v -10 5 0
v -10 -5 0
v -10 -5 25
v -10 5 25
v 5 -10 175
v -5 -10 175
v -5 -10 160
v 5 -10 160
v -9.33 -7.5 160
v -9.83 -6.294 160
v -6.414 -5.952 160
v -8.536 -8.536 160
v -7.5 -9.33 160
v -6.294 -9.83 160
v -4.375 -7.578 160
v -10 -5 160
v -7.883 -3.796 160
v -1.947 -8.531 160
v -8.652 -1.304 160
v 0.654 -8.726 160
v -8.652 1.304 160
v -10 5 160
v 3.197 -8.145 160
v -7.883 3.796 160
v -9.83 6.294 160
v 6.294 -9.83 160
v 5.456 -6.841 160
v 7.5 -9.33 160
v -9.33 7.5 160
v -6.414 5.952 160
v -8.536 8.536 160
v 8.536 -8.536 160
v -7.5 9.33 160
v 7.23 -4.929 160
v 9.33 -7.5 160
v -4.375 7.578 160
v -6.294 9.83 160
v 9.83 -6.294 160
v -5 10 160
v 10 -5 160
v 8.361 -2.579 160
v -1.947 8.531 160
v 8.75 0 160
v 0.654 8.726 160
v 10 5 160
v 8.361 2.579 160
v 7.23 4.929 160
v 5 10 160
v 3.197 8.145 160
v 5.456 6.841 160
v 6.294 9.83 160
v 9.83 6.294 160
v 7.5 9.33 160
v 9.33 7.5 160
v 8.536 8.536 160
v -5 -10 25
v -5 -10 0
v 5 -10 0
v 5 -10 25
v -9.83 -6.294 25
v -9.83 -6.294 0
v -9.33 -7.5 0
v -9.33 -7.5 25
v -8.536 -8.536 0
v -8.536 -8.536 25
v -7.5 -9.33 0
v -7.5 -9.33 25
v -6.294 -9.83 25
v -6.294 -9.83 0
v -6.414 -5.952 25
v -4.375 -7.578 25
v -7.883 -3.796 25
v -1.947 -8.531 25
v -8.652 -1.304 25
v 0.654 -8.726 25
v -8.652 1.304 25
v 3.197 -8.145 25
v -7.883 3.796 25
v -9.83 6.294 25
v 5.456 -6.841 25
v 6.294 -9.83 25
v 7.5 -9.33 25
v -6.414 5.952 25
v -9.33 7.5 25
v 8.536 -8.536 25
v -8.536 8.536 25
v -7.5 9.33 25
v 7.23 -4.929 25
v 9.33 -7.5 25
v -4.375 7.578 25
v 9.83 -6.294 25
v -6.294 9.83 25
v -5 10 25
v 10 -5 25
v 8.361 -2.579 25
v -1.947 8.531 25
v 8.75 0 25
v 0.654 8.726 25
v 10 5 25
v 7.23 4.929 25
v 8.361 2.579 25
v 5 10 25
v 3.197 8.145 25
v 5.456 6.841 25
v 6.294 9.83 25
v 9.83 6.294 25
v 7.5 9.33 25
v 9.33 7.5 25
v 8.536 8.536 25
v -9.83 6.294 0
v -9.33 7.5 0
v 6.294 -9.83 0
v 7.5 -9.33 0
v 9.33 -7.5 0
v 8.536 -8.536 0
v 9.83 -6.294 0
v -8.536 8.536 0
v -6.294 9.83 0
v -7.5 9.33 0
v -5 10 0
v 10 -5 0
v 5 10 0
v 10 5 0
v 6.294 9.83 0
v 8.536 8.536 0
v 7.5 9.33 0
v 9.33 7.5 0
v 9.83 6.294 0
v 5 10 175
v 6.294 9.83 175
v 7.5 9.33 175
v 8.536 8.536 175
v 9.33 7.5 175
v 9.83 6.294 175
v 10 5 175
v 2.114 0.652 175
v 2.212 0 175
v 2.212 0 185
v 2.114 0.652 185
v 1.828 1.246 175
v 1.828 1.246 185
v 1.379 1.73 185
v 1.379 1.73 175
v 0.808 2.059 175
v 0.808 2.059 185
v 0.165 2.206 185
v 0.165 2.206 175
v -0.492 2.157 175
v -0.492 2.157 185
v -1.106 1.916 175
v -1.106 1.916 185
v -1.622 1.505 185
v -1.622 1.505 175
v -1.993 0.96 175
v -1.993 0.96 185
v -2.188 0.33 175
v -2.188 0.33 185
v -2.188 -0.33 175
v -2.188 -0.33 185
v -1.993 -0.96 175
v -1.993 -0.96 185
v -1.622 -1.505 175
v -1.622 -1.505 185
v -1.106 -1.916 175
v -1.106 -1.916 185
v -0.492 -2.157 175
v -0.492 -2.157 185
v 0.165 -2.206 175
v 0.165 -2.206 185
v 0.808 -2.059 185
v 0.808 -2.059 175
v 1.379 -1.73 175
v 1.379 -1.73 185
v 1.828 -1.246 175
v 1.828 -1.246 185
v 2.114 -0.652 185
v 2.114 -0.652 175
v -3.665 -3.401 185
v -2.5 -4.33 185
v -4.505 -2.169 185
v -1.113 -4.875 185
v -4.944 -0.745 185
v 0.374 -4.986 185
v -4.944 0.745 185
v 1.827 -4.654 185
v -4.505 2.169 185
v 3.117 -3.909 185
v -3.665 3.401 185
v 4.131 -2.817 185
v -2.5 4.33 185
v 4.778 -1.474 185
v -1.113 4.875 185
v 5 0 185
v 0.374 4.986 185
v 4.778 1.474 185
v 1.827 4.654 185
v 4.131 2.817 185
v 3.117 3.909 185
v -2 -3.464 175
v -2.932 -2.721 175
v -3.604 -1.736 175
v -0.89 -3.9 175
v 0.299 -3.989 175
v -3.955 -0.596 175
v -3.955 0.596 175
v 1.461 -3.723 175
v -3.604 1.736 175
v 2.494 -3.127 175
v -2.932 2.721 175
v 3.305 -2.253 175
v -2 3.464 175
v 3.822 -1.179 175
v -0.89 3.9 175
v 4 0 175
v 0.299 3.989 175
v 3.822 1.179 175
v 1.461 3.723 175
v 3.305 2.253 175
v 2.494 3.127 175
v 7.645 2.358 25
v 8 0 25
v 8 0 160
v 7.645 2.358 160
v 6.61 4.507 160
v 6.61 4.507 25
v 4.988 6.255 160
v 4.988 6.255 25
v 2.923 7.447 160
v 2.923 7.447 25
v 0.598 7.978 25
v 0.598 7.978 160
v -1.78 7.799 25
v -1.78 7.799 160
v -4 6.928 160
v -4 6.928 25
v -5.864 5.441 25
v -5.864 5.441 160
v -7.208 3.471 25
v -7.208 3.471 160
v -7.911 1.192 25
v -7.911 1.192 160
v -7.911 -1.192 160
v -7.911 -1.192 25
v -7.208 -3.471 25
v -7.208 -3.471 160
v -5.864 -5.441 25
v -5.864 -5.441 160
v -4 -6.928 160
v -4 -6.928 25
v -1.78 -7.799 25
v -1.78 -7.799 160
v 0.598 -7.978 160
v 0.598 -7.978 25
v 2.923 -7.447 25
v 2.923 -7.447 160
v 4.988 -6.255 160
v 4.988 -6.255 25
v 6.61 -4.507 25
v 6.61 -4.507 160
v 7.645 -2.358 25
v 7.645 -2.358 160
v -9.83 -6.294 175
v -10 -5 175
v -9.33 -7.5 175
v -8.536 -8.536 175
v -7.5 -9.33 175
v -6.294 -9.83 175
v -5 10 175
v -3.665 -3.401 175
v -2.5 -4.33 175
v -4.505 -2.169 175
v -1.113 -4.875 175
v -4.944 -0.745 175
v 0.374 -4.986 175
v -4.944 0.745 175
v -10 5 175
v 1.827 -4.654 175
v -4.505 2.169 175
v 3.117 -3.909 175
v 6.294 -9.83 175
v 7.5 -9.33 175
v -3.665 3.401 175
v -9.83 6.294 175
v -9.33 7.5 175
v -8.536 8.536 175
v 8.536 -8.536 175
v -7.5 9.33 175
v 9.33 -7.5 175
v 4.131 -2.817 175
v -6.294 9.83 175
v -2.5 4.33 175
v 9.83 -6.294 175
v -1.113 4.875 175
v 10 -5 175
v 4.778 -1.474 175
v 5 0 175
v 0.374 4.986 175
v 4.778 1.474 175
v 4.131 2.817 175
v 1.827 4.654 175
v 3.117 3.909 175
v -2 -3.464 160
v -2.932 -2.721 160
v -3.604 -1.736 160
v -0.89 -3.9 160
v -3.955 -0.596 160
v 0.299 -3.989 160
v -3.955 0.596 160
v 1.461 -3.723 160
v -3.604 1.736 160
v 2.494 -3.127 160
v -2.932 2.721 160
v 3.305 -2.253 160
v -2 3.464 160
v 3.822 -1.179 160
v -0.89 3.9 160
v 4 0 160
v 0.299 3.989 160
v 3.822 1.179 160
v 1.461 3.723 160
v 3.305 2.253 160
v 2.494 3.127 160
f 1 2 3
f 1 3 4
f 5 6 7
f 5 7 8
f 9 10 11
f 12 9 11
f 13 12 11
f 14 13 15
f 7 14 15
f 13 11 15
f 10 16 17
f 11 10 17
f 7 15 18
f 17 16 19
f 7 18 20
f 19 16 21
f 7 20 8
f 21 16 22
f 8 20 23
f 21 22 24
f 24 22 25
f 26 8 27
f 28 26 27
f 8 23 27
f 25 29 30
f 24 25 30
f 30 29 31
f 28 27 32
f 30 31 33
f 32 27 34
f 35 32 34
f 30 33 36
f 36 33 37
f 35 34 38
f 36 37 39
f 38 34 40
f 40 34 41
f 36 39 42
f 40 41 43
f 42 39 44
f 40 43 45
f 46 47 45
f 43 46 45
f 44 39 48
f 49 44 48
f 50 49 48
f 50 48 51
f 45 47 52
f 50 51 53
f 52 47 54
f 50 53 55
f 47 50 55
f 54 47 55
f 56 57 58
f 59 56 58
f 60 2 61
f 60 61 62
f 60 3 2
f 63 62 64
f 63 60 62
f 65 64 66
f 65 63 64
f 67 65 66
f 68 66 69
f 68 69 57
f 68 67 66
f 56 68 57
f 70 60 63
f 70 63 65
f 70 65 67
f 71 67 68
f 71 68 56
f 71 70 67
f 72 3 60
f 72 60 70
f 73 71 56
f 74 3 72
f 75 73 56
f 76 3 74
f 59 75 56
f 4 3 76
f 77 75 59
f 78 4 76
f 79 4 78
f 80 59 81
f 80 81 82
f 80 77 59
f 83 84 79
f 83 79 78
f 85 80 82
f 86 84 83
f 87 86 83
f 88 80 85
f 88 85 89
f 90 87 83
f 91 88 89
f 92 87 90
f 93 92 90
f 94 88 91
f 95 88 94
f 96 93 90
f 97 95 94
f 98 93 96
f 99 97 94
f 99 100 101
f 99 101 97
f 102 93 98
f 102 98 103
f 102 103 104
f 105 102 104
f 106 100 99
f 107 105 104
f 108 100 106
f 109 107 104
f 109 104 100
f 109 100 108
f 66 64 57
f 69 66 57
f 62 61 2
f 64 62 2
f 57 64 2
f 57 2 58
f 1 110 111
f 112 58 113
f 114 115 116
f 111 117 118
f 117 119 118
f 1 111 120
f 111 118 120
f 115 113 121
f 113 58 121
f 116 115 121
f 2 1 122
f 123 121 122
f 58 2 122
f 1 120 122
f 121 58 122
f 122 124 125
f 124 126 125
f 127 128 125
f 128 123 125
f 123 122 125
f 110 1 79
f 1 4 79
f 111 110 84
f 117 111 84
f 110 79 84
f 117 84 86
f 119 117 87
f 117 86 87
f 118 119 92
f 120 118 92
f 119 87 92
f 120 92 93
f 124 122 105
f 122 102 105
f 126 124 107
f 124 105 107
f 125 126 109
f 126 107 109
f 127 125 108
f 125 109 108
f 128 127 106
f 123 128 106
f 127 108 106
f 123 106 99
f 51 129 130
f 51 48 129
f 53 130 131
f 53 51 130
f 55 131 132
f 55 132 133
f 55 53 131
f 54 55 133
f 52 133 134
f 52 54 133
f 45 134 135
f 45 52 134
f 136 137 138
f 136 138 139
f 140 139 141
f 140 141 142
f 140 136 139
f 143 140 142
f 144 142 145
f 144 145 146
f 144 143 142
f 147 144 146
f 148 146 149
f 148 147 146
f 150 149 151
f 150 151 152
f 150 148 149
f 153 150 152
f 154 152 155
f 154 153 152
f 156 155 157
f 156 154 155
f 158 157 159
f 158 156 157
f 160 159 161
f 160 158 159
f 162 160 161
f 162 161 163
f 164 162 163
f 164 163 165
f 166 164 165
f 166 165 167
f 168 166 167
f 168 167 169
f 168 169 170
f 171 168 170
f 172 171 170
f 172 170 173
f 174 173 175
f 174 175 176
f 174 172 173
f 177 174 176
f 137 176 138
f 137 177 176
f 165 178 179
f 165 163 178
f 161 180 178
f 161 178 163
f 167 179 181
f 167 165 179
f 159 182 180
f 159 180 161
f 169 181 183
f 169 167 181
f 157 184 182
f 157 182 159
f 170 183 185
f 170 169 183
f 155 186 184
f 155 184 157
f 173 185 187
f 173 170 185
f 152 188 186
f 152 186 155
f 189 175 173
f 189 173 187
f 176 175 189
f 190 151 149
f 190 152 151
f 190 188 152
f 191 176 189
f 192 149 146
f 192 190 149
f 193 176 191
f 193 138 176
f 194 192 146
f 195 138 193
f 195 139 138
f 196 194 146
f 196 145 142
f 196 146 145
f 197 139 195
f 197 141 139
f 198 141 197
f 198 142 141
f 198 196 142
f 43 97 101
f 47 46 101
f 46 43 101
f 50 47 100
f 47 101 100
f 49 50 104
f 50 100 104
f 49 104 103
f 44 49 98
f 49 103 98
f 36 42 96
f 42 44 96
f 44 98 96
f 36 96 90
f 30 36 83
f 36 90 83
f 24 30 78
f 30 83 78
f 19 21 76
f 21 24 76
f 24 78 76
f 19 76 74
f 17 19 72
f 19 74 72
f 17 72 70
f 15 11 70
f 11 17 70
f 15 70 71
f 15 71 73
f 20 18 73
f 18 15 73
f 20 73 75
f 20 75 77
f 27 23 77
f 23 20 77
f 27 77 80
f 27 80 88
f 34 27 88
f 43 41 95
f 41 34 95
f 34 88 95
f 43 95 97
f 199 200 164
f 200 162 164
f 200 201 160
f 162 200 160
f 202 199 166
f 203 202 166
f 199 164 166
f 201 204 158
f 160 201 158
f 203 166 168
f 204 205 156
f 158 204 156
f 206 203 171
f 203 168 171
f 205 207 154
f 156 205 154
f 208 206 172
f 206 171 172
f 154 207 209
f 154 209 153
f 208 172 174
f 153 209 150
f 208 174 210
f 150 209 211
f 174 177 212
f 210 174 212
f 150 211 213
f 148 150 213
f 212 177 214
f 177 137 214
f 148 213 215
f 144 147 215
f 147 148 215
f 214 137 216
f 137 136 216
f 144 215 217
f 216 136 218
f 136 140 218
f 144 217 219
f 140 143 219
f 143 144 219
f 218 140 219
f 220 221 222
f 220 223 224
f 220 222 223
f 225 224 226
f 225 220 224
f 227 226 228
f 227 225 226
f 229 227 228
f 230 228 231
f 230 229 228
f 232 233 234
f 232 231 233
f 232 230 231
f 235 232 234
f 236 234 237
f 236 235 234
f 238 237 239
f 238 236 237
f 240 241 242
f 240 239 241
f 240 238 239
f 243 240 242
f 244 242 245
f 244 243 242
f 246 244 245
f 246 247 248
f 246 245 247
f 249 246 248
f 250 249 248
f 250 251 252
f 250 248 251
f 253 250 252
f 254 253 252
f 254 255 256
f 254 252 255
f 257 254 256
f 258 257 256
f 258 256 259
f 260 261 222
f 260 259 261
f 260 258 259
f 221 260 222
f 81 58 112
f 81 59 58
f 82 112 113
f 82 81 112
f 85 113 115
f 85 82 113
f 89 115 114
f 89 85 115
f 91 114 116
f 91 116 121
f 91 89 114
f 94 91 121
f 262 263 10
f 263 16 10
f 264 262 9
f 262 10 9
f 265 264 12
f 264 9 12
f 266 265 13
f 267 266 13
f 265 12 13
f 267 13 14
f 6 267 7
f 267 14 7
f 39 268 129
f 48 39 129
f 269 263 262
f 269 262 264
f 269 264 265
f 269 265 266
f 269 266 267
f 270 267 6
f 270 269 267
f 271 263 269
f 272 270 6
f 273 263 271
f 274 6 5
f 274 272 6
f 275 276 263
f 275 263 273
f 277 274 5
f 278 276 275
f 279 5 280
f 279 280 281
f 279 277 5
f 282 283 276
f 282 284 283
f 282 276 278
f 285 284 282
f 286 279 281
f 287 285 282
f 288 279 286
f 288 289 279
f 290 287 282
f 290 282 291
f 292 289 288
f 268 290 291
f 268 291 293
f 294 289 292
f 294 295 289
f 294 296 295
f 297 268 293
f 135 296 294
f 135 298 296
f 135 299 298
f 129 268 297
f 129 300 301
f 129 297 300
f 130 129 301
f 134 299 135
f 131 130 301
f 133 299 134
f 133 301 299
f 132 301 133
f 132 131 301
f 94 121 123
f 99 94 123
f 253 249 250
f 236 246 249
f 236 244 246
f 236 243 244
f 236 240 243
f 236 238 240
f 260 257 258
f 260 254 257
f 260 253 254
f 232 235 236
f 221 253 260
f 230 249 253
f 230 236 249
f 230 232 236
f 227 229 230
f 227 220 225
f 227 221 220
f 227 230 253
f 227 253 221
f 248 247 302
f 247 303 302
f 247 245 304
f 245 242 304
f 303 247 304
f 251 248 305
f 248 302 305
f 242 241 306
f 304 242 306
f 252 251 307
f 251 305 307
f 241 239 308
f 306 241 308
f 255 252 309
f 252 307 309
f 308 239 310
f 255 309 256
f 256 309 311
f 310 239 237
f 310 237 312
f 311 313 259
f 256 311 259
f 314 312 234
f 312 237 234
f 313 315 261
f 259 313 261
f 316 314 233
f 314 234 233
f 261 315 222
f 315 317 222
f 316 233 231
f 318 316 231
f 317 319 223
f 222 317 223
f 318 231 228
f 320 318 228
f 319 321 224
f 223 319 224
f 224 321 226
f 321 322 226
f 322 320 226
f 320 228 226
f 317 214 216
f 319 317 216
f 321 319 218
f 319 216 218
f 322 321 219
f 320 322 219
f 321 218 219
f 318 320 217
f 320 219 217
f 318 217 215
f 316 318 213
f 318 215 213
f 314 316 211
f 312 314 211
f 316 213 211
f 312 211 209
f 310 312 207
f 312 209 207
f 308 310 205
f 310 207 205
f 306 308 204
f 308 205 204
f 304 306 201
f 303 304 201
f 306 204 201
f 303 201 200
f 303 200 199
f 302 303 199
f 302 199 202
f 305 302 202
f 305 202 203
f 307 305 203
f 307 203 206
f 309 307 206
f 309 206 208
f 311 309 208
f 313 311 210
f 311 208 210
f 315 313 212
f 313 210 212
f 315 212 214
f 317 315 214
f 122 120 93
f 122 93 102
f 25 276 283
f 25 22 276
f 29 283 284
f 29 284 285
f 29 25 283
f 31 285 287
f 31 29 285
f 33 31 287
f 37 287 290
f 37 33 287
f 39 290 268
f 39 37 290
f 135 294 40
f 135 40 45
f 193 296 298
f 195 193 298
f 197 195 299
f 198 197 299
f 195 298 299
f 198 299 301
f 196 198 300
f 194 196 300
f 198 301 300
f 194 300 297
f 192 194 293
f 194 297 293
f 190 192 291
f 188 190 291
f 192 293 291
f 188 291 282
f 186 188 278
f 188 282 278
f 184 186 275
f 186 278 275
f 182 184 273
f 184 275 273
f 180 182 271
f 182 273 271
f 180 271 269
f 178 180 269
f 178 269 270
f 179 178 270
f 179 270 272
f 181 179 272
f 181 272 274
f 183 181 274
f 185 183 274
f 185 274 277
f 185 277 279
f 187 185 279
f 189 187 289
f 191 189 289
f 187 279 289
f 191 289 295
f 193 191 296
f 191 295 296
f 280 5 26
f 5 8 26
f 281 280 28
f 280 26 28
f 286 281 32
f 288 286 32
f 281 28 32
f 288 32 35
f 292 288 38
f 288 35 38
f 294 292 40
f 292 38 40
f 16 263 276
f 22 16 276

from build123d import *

# Parameters (mm, degrees)
SKETCH_1_R      = 8.75
SKETCH_1_R_2    = 8
EXTRUDE_1_DEPTH = 175
SKETCH_2_W      = 20
SKETCH_2_H      = 20
EXTRUDE_2_DEPTH = 25
SKETCH_3_W      = 20
SKETCH_3_H      = 20
SKETCH_3_R      = 4
EXTRUDE_3_DEPTH = 15
FILLET_1_R      = 5
SKETCH_5_R      = 5
SKETCH_5_R_2    = 2.212387265
EXTRUDE_4_DEPTH = 10


with BuildPart() as part:
    # 草图1 → 凸台-拉伸1 (new body)
    with BuildSketch(Plane.XY):
        Circle(SKETCH_1_R)
        Circle(SKETCH_1_R_2, mode=Mode.SUBTRACT)
    extrude(amount=EXTRUDE_1_DEPTH)

    # 草图2 → 凸台-拉伸2 (add)
    with BuildSketch(Plane.XY):
        Rectangle(SKETCH_2_W, SKETCH_2_H)
    extrude(amount=EXTRUDE_2_DEPTH)

    # 草图3 → 凸台-拉伸3 (add)
    with BuildSketch(Plane.XY.offset(175)):
        Rectangle(SKETCH_3_W, SKETCH_3_H)
        Circle(SKETCH_3_R, mode=Mode.SUBTRACT)
    extrude(amount=-EXTRUDE_3_DEPTH)

    # 圆角1
    fillet_1_edges = [part.edges().sort_by_distance(p)[0] for p in [
        (10, -10, 12.5),
        (10, 10, 12.5),
        (-10, 10, 12.5),
        (-10, -10, 12.5),
        (10, -10, 167.5),
        (-10, -10, 167.5),
        (-10, 10, 167.5),
        (10, 10, 167.5),
    ]]
    fillet(fillet_1_edges, radius=FILLET_1_R)

    # 草图5 → 凸台-拉伸4 (add)
    with BuildSketch(Plane.XY.offset(175)):
        Circle(SKETCH_5_R)
        Circle(SKETCH_5_R_2, mode=Mode.SUBTRACT)
    extrude(amount=EXTRUDE_4_DEPTH)


solid = part.part
